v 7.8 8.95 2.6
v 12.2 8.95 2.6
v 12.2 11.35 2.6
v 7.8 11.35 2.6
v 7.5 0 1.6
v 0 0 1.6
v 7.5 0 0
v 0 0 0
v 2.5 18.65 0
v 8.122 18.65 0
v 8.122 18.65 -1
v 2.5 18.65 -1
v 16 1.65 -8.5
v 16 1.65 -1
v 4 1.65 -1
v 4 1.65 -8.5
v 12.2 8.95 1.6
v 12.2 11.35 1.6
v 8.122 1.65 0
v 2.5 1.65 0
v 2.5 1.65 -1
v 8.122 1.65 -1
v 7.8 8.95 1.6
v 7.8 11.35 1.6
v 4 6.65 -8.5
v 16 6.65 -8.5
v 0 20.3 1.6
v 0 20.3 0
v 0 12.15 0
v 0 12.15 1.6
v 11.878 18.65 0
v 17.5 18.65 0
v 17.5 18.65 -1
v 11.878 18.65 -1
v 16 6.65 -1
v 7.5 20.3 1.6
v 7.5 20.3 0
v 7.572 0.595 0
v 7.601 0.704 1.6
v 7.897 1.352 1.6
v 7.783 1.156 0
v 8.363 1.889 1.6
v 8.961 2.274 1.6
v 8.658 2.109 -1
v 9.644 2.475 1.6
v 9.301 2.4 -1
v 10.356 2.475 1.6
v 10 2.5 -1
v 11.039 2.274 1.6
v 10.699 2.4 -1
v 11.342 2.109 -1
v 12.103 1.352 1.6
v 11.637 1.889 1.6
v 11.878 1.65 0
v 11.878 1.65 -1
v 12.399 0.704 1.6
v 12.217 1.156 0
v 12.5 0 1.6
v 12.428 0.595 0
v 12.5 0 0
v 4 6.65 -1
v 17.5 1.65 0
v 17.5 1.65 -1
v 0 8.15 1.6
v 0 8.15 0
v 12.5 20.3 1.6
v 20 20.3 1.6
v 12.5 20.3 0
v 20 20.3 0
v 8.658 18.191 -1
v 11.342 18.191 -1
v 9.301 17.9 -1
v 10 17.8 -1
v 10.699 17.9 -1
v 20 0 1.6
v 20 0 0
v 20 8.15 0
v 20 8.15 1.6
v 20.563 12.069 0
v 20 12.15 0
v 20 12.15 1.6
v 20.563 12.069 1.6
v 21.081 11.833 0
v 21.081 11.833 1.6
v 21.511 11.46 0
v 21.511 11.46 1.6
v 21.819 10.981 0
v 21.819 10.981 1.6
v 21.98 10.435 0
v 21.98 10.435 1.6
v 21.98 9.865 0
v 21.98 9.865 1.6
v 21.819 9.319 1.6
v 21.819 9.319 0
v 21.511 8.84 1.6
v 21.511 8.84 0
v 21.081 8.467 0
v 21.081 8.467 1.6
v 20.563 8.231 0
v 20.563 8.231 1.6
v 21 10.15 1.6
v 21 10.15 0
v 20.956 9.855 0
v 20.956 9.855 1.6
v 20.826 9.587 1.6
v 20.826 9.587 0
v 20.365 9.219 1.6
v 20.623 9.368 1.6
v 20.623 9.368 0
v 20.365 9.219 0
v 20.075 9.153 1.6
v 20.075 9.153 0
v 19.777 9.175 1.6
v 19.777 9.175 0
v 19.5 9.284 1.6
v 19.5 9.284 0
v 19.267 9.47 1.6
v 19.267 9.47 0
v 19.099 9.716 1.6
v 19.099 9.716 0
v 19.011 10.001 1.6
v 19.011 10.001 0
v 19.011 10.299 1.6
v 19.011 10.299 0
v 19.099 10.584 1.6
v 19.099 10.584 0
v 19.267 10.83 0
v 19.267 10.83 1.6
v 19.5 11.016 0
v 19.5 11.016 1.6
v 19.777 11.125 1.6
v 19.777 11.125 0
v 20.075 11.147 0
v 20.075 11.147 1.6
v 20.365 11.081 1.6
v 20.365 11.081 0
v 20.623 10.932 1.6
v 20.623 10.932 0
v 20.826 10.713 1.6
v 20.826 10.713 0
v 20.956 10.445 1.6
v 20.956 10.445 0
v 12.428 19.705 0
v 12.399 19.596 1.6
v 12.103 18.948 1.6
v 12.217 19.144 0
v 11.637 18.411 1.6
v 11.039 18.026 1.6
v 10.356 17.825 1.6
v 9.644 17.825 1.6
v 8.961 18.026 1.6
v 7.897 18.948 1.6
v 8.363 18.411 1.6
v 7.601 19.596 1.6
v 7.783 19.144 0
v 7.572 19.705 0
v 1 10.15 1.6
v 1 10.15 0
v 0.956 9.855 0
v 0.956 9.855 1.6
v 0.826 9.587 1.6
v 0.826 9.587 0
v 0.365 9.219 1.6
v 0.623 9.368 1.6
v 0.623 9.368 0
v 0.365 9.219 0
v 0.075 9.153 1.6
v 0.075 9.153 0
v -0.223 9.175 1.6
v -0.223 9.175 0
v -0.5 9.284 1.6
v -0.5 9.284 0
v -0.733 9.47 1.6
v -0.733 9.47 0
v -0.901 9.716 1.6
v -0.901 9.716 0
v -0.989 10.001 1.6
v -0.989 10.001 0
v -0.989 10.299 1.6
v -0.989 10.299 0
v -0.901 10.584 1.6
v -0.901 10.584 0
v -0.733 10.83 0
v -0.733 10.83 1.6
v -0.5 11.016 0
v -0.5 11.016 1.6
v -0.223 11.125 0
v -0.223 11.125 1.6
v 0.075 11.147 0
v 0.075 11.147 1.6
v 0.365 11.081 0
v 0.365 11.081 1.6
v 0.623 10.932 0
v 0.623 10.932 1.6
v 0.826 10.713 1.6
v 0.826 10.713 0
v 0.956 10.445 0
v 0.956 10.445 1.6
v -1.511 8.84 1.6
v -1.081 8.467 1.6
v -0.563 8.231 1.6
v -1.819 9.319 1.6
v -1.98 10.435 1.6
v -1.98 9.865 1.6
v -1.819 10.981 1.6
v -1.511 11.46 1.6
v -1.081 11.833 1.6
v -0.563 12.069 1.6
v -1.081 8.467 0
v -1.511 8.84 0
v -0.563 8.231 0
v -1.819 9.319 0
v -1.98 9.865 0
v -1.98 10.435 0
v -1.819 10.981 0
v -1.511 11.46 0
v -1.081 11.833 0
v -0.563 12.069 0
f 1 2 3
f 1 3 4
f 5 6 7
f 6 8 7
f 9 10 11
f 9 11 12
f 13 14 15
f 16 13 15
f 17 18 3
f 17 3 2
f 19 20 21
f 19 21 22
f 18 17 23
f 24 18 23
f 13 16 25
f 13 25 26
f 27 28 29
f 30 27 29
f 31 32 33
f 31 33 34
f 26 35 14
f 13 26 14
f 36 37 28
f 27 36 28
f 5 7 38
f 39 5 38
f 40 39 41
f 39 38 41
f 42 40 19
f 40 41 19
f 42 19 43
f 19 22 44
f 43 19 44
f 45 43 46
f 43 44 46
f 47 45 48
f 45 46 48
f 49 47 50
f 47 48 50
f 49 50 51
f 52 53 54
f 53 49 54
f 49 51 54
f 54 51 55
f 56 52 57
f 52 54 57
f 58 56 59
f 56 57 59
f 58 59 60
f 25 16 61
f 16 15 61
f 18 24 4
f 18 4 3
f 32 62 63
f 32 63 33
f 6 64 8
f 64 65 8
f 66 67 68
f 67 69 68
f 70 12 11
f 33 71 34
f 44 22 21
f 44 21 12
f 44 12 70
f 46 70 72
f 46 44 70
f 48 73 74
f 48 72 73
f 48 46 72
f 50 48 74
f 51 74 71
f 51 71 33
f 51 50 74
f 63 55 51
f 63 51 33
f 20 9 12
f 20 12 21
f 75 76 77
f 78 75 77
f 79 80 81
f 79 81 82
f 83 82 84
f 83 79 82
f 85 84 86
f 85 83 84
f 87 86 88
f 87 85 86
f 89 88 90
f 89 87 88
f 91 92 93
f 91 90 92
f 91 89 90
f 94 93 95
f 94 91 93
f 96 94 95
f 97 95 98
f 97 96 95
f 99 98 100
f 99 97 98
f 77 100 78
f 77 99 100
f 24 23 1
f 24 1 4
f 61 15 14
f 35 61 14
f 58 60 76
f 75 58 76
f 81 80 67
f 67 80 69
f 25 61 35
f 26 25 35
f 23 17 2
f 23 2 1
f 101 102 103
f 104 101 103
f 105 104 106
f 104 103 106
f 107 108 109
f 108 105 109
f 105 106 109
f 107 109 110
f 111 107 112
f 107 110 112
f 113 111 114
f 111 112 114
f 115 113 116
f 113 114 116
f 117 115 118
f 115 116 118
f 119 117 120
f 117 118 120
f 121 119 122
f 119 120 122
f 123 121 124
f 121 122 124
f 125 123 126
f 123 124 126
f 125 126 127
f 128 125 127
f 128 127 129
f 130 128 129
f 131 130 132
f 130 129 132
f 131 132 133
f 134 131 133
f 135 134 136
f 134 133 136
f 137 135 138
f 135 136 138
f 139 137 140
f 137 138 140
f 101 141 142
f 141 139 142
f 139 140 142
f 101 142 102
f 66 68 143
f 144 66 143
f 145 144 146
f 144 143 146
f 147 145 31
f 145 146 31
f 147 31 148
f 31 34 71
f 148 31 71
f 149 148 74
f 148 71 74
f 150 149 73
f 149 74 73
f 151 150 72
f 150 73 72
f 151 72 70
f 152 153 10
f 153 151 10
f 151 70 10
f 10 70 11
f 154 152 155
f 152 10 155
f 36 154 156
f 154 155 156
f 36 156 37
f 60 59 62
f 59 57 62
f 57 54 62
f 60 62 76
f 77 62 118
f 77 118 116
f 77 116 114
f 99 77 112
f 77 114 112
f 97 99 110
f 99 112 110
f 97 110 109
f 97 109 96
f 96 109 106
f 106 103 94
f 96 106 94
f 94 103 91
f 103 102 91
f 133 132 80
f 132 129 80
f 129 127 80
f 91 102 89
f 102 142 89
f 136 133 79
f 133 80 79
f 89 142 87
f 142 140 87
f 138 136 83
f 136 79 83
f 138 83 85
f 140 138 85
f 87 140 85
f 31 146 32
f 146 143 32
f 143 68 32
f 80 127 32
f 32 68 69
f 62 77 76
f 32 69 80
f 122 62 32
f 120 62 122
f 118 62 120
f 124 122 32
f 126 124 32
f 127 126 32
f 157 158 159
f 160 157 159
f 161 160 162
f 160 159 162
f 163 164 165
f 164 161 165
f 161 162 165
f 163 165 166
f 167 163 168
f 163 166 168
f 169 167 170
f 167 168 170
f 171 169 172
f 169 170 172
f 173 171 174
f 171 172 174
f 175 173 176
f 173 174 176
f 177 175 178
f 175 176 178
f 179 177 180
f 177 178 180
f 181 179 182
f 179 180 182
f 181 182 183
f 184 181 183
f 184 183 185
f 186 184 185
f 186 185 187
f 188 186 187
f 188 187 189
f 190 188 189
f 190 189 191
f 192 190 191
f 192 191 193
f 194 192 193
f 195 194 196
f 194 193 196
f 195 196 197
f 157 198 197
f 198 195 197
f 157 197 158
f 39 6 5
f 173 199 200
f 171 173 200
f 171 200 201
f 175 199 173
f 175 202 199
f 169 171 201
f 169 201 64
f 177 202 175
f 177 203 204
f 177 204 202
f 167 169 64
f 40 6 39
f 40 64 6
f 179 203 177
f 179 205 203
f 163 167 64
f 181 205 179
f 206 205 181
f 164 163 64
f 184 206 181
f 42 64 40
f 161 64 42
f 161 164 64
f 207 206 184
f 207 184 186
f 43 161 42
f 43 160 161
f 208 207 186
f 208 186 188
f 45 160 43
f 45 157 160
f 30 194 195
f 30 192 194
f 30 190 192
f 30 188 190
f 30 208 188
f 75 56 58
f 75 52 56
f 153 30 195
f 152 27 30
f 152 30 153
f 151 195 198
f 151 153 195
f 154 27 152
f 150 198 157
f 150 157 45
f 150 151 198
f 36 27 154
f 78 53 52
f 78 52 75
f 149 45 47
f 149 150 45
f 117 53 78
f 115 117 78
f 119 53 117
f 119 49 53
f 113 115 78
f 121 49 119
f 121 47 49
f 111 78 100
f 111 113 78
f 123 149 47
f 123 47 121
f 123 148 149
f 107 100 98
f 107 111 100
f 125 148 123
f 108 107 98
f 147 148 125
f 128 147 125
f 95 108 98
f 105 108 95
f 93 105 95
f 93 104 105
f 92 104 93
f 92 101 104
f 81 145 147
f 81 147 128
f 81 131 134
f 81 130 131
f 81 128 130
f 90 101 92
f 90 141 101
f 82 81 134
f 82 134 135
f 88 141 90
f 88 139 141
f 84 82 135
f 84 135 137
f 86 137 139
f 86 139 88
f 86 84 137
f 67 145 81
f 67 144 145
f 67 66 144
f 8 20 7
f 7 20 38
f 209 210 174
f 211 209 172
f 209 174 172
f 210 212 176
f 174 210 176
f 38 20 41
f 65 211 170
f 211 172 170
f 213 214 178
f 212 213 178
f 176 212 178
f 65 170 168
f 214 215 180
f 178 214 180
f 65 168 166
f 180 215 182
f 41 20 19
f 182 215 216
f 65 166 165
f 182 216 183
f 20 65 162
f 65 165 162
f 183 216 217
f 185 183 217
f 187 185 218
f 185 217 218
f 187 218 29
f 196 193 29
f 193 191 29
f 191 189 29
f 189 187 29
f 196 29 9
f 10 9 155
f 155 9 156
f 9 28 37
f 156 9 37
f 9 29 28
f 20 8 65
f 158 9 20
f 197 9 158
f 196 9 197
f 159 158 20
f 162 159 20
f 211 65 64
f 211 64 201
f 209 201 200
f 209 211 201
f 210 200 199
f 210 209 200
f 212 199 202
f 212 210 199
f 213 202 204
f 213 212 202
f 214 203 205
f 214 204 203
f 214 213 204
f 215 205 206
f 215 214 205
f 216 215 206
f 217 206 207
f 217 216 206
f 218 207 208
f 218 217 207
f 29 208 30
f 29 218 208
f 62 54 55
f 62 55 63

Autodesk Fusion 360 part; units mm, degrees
sketch "Esquisse1" plane through (0, 0, 0) normal (0, 0, 1) x (1, 0, 0)
  line L0 (10, 13.25) -> (10, 7.05) construction
  line L1 (-3, 10.15) -> (23, 10.15) construction
  circle A0 centre (20, 10.15) radius 1
  circle A1 centre (0, 10.15) radius 1
  arc A2 (7.5, 20.3) -> (12.5, 20.3) centre (10, 20.3) ccw
  line L2 (20, 20.3) -> (12.5, 20.3)
  line L3 (7.5, 20.3) -> (0, 20.3)
  line L4 (20, 0) -> (20, 8.15)
  line L5 (20, 12.15) -> (20, 20.3)
  arc A3 (20, 8.15) -> (20, 12.15) centre (20, 10.15) ccw
  line L6 (0, 0) -> (7.5, 0)
  line L7 (12.5, 0) -> (20, 0)
  arc A4 (12.5, 0) -> (7.5, 0) centre (10, 0) ccw
  line L8 (0, 20.3) -> (0, 12.15)
  line L9 (0, 8.15) -> (0, 0)
  arc A5 (0, 12.15) -> (0, 8.15) centre (0, 10.15) ccw
  line L10 (0, 0) -> (20, 20.3) construction
  line L11 (0, 20.3) -> (20, 0) construction
  dimension "d1" = 20
  dimension "d2" = 20.3
  dimension "d3" = 5
  dimension "d4" = 5
  dimension "d5" = 4
  dimension "d6" = 4
  dimension "d7" = 2
  dimension "d8" = 2
extrude "Extrusion1" add sketch "Esquisse1" along normal blind 1.6 makes body 1
sketch "Esquisse2" plane through (0, 0, 1.6) normal (0, 0, 1) x (-1, 0, 0)
  circle A0 centre (-20, -10.15) radius 1
  circle A1 centre (0, -10.15) radius 1
  line L0 (-7.5, -20.3) -> (0, -20.3)
  line L1 (0, -20.3) -> (0, -12.15)
  arc A2 (0, -12.15) -> (0, -8.15) centre (0, -10.15) ccw
  line L2 (0, -8.15) -> (0, 0)
  line L3 (0, 0) -> (-7.5, 0)
  arc A3 (-12.5, 0) -> (-7.5, 0) centre (-10, 0) ccw
  line L4 (-12.5, 0) -> (-20, 0)
  line L5 (-20, 0) -> (-20, -8.15)
  arc A4 (-20, -8.15) -> (-20, -12.15) centre (-20, -10.15) ccw
  line L6 (-20, -12.15) -> (-20, -20.3)
  line L7 (-20, -20.3) -> (-12.5, -20.3)
  arc A5 (-7.5, -20.3) -> (-12.5, -20.3) centre (-10, -20.3) ccw
  line L8 (0, 0) -> (-20, -20.3) construction
  line L9 (0, -20.3) -> (-20, 0) construction
  line L10 (-12.2, -8.95) -> (-7.8, -8.95)
  line L11 (-7.8, -8.95) -> (-7.8, -11.35)
  line L12 (-7.8, -11.35) -> (-12.2, -11.35)
  line L13 (-12.2, -11.35) -> (-12.2, -8.95)
  line L14 (-12.2, -8.95) -> (-7.8, -11.35) construction
  line L15 (-7.8, -8.95) -> (-12.2, -11.35) construction
  point P0 (-10, -10.15)
  dimension "d11" = 4.4
  dimension "d12" = 2.4
extrude "Extrusion2" add sketch "Esquisse2" along normal blind 1 separate body contours L10 L11 L12 L13 makes body 2
sketch "Esquisse3" plane through (0, 0, 0) normal (0, 0, -1) x (1, 0, 0)
  circle A0 centre (20, -10.15) radius 1
  circle A1 centre (0, -10.15) radius 1
  line L0 (0, -20.3) -> (7.5, -20.3)
  arc A2 (12.5, -20.3) -> (7.5, -20.3) centre (10, -20.3) ccw
  line L1 (12.5, -20.3) -> (20, -20.3)
  line L2 (20, -20.3) -> (20, -12.15)
  arc A3 (20, -12.15) -> (20, -8.15) centre (20, -10.15) ccw
  line L3 (20, -8.15) -> (20, 0)
  line L4 (20, 0) -> (12.5, 0)
  arc A4 (7.5, 0) -> (12.5, 0) centre (10, 0) ccw
  line L5 (7.5, 0) -> (0, 0)
  line L6 (0, 0) -> (0, -8.15)
  arc A5 (0, -8.15) -> (0, -12.15) centre (0, -10.15) ccw
  line L7 (0, -12.15) -> (0, -20.3)
  line L8 (2.5, -1.65) -> (17.5, -1.65)
  line L9 (17.5, -1.65) -> (17.5, -18.65)
  line L10 (17.5, -18.65) -> (2.5, -18.65)
  line L11 (2.5, -18.65) -> (2.5, -1.65)
  line L12 (0, 0) -> (20, -20.3) construction
  line L13 (0, -20.3) -> (20, 0) construction
  line L14 (2.5, -1.65) -> (17.5, -18.65) construction
  line L15 (2.5, -18.65) -> (17.5, -1.65) construction
  dimension "d15" = 15
  dimension "d16" = 17
extrude "Extrusion3" add sketch "Esquisse3" along normal blind 1 contours A2 A4 L8 L9 L10 L11 bodies 1
sketch "Esquisse4" plane through (0, 0, -1) normal (0, 0, -1) x (1, 0, 0)
  line L0 (2.5, -18.65) -> (8.1218, -18.65)
  arc A0 (11.8782, -18.65) -> (8.1218, -18.65) centre (10, -20.3) ccw
  line L1 (11.8782, -18.65) -> (17.5, -18.65)
  line L2 (17.5, -18.65) -> (17.5, -1.65)
  line L3 (17.5, -1.65) -> (11.8782, -1.65)
  arc A1 (8.1218, -1.65) -> (11.8782, -1.65) centre (10, 0) ccw
  line L4 (8.1218, -1.65) -> (2.5, -1.65)
  line L5 (2.5, -1.65) -> (2.5, -18.65)
  line L6 (4, -6.65) -> (16, -6.65)
  line L7 (16, -6.65) -> (16, -1.65)
  line L8 (16, -1.65) -> (4, -1.65)
  line L9 (4, -1.65) -> (4, -6.65)
  line L10 (10, 6.5949) -> (10, -9.8949) construction
  dimension "d19" = 12
  dimension "d20" = 5
extrude "Extrusion4" add sketch "Esquisse4" along normal blind 7.5 separate body contours L3 A1 L4 L6 L7 L8 L9 | A1 L8 makes body 3
equation "d4 = d3"
